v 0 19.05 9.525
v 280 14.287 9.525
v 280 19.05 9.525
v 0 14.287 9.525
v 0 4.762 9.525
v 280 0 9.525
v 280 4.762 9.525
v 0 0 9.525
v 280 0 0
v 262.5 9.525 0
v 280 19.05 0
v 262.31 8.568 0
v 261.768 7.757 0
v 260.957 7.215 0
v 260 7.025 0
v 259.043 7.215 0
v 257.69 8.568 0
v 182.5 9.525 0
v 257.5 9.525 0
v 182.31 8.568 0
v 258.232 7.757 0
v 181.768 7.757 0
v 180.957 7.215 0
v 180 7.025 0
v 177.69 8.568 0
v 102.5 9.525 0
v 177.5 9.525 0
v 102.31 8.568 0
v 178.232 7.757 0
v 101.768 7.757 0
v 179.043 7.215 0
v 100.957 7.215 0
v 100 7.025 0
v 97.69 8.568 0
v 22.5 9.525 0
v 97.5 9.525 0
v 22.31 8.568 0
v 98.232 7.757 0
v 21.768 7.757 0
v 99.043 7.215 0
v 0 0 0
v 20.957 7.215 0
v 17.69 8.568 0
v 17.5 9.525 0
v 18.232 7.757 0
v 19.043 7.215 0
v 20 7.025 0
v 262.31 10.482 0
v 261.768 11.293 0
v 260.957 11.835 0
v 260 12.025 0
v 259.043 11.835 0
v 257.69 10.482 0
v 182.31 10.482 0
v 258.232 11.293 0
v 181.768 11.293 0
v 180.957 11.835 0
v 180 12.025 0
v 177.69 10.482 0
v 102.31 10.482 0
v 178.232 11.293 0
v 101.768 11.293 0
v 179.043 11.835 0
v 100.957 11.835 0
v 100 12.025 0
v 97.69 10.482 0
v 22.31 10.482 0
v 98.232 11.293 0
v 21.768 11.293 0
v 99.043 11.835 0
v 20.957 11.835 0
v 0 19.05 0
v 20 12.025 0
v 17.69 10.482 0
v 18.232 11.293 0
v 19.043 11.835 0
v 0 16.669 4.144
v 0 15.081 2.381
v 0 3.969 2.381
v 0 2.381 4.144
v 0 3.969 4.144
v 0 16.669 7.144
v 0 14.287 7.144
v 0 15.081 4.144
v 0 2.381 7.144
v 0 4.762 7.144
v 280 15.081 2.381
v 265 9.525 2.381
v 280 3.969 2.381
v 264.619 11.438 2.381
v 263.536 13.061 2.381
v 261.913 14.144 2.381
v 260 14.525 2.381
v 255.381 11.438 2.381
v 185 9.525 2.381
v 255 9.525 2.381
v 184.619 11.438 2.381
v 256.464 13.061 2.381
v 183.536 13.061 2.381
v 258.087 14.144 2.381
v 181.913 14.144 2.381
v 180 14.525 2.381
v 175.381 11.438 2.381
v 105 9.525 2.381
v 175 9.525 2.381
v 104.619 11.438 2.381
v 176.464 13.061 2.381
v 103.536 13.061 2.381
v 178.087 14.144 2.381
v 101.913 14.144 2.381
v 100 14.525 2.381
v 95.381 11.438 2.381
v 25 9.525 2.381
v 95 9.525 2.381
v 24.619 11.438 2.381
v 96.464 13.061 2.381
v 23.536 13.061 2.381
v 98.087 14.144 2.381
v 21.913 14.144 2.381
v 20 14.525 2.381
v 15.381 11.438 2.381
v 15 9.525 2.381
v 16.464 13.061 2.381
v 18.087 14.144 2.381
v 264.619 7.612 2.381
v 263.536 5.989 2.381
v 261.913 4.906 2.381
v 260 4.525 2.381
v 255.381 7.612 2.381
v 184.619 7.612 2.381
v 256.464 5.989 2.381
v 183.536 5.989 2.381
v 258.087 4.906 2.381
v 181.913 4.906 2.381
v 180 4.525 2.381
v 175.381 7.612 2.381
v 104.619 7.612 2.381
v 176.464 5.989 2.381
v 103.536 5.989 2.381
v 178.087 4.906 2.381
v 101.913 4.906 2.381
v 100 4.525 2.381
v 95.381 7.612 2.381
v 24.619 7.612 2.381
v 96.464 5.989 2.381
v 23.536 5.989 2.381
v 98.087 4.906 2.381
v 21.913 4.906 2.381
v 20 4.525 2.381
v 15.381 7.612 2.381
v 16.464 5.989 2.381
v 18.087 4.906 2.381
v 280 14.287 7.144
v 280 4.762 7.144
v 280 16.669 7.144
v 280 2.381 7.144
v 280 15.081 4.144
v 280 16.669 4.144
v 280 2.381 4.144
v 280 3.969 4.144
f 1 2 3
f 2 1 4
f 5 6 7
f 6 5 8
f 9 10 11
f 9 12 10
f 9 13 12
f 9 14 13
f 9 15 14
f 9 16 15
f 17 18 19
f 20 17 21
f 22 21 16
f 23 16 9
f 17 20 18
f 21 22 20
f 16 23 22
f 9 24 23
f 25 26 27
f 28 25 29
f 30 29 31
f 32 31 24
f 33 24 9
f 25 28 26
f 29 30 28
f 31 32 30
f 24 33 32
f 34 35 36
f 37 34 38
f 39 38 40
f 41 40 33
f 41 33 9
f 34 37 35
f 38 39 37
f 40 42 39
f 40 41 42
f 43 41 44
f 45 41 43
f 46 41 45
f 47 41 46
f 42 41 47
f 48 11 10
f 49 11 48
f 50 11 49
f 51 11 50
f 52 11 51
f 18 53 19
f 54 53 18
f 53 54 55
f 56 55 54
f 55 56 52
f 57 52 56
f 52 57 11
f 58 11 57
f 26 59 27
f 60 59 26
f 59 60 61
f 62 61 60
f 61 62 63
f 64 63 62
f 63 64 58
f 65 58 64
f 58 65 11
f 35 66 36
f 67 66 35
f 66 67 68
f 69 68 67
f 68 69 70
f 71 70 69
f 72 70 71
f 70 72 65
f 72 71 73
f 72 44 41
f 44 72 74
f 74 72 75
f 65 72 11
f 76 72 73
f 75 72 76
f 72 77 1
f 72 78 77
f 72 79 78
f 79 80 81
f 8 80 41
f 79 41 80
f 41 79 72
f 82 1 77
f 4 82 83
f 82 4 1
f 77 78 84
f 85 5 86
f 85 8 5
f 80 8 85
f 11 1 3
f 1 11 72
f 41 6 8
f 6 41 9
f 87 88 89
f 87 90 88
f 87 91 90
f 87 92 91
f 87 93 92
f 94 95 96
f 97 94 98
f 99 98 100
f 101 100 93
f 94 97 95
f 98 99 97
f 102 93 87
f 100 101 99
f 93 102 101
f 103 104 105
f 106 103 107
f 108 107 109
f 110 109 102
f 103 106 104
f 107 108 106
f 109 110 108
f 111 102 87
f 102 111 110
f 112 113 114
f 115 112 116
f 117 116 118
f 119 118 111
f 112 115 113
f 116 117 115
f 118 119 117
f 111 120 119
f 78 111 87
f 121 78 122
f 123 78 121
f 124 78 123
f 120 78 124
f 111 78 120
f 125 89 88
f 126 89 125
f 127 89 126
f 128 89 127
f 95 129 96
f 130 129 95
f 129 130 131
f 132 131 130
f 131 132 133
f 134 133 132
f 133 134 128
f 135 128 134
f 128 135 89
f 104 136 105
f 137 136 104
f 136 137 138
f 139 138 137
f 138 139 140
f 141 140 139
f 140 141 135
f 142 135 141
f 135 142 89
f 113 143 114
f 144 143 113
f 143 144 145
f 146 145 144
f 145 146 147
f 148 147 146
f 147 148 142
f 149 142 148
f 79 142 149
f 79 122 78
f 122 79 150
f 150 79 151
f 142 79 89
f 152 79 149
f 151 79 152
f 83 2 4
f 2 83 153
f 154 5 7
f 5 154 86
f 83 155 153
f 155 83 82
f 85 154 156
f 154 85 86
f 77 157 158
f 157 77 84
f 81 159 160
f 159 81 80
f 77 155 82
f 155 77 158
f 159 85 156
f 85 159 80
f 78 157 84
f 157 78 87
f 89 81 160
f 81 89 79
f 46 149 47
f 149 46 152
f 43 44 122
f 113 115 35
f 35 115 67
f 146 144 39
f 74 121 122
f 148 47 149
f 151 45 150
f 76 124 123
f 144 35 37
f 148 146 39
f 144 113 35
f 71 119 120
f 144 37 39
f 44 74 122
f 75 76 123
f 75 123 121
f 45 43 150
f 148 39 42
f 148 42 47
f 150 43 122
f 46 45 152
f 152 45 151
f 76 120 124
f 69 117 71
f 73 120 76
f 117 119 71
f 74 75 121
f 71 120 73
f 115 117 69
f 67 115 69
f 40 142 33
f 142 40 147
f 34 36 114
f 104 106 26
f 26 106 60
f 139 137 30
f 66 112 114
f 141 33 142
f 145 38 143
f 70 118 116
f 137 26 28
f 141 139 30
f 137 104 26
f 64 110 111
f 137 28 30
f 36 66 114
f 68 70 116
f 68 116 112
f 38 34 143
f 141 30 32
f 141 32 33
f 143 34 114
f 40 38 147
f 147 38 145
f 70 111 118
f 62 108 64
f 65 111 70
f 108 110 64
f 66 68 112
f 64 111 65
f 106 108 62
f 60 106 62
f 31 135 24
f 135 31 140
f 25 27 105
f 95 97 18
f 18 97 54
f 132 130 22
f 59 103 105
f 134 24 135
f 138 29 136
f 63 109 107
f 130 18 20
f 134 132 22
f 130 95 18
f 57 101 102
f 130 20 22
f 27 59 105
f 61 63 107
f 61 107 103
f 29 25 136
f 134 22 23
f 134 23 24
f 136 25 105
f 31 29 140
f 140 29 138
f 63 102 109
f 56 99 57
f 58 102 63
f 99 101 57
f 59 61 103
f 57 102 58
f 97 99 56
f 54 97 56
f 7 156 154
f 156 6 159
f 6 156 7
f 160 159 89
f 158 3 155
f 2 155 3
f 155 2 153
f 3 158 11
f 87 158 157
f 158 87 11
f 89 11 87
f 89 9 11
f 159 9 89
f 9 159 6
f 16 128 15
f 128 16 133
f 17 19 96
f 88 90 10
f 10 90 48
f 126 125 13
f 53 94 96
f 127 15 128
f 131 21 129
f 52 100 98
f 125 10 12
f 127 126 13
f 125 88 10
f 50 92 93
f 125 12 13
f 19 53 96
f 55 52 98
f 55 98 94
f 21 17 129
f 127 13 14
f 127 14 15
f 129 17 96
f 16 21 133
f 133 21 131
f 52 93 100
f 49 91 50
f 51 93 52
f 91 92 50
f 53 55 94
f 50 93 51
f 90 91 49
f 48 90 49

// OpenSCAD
//////////////////////////////
// File: t-track.scad       //
// Title: T-Track           //
// Version: 1.1.0           //
// Author: Nicholas Feldman //
//////////////////////////////

// Description:
//
// T-Track for woodworking jigs and assembly tables.
// Designed based on Rockler and Powertec tracks.
// 
// I recommend printing on end, using a raft.
// This is the best alignment for most strength possible.
//
// Should be compatible with most T-Bolts,
// But values might need to be tweaked based on how accurate your printer is,
// as well as to account for horizontal expansion. However, I recommend tweaking
// the horizontal expansion value in your slicer instead of adjusting here.

// Version History:
//
// 1.0.0:
//   - Initial Version, create basic t-track profile
// 1.0.1:
//   - Widen countersunk screw hole
// 1.1.0:
//   - Only put holes in every other segment, if odd number of segments

track_height = 9.525;
track_width = 19.05;
track_length = 40;

slot_width = 9.525;
slot_depth = 7.144;

// How far below the surface the "T" is
t_slot_depth = 2.381;
t_slot_width = 14.2875;
t_slot_height = 3;

// I don't know what the point of this phat bottom is but whatever
slot_bottom_width = 11.1125;
slot_bottom_height = slot_depth - t_slot_height - t_slot_depth;

screw_hole_width = 5;
screw_hole_height = track_height - slot_depth;

track_segments = 7;

module ttrack(n, create_screw_hole = true) {
    translate([track_length*(n-1), 0, 0])
    difference() {
        // Main Body of the track
        cube([track_length, track_width, track_height], 0);
        
        // Main slot cutout
        translate([0, (track_width/2)-(slot_width/2), track_height-slot_depth])
        cube([track_length, slot_width, slot_depth], 0);
        
        // Wider "T" cut out
        translate([0, (track_width/2)-(t_slot_width/2), track_height-t_slot_depth-t_slot_height])
        cube([track_length, t_slot_width, t_slot_height],0);
        
        // Bottom expansion cutout
        translate([0, (track_width/2)-(slot_bottom_width/2), track_height-t_slot_depth-t_slot_height - slot_bottom_height])
        cube([track_length, slot_bottom_width, slot_bottom_height], 0);
        
        // Counterunk screw hole
        if (create_screw_hole) {
            translate([track_length/2, track_width/2, 0])
            cylinder(h=screw_hole_height, d1=screw_hole_width, d2=screw_hole_width*2);
        }
   }
}

// Straight t-track
for (i = [1:track_segments]) {
    // If number of segments is even, we put a screw hole in every one.
    // Otherwise we put one in every other segment
    ttrack(i, (track_segments % 2 == 0) || i % 2 != 0);
}
